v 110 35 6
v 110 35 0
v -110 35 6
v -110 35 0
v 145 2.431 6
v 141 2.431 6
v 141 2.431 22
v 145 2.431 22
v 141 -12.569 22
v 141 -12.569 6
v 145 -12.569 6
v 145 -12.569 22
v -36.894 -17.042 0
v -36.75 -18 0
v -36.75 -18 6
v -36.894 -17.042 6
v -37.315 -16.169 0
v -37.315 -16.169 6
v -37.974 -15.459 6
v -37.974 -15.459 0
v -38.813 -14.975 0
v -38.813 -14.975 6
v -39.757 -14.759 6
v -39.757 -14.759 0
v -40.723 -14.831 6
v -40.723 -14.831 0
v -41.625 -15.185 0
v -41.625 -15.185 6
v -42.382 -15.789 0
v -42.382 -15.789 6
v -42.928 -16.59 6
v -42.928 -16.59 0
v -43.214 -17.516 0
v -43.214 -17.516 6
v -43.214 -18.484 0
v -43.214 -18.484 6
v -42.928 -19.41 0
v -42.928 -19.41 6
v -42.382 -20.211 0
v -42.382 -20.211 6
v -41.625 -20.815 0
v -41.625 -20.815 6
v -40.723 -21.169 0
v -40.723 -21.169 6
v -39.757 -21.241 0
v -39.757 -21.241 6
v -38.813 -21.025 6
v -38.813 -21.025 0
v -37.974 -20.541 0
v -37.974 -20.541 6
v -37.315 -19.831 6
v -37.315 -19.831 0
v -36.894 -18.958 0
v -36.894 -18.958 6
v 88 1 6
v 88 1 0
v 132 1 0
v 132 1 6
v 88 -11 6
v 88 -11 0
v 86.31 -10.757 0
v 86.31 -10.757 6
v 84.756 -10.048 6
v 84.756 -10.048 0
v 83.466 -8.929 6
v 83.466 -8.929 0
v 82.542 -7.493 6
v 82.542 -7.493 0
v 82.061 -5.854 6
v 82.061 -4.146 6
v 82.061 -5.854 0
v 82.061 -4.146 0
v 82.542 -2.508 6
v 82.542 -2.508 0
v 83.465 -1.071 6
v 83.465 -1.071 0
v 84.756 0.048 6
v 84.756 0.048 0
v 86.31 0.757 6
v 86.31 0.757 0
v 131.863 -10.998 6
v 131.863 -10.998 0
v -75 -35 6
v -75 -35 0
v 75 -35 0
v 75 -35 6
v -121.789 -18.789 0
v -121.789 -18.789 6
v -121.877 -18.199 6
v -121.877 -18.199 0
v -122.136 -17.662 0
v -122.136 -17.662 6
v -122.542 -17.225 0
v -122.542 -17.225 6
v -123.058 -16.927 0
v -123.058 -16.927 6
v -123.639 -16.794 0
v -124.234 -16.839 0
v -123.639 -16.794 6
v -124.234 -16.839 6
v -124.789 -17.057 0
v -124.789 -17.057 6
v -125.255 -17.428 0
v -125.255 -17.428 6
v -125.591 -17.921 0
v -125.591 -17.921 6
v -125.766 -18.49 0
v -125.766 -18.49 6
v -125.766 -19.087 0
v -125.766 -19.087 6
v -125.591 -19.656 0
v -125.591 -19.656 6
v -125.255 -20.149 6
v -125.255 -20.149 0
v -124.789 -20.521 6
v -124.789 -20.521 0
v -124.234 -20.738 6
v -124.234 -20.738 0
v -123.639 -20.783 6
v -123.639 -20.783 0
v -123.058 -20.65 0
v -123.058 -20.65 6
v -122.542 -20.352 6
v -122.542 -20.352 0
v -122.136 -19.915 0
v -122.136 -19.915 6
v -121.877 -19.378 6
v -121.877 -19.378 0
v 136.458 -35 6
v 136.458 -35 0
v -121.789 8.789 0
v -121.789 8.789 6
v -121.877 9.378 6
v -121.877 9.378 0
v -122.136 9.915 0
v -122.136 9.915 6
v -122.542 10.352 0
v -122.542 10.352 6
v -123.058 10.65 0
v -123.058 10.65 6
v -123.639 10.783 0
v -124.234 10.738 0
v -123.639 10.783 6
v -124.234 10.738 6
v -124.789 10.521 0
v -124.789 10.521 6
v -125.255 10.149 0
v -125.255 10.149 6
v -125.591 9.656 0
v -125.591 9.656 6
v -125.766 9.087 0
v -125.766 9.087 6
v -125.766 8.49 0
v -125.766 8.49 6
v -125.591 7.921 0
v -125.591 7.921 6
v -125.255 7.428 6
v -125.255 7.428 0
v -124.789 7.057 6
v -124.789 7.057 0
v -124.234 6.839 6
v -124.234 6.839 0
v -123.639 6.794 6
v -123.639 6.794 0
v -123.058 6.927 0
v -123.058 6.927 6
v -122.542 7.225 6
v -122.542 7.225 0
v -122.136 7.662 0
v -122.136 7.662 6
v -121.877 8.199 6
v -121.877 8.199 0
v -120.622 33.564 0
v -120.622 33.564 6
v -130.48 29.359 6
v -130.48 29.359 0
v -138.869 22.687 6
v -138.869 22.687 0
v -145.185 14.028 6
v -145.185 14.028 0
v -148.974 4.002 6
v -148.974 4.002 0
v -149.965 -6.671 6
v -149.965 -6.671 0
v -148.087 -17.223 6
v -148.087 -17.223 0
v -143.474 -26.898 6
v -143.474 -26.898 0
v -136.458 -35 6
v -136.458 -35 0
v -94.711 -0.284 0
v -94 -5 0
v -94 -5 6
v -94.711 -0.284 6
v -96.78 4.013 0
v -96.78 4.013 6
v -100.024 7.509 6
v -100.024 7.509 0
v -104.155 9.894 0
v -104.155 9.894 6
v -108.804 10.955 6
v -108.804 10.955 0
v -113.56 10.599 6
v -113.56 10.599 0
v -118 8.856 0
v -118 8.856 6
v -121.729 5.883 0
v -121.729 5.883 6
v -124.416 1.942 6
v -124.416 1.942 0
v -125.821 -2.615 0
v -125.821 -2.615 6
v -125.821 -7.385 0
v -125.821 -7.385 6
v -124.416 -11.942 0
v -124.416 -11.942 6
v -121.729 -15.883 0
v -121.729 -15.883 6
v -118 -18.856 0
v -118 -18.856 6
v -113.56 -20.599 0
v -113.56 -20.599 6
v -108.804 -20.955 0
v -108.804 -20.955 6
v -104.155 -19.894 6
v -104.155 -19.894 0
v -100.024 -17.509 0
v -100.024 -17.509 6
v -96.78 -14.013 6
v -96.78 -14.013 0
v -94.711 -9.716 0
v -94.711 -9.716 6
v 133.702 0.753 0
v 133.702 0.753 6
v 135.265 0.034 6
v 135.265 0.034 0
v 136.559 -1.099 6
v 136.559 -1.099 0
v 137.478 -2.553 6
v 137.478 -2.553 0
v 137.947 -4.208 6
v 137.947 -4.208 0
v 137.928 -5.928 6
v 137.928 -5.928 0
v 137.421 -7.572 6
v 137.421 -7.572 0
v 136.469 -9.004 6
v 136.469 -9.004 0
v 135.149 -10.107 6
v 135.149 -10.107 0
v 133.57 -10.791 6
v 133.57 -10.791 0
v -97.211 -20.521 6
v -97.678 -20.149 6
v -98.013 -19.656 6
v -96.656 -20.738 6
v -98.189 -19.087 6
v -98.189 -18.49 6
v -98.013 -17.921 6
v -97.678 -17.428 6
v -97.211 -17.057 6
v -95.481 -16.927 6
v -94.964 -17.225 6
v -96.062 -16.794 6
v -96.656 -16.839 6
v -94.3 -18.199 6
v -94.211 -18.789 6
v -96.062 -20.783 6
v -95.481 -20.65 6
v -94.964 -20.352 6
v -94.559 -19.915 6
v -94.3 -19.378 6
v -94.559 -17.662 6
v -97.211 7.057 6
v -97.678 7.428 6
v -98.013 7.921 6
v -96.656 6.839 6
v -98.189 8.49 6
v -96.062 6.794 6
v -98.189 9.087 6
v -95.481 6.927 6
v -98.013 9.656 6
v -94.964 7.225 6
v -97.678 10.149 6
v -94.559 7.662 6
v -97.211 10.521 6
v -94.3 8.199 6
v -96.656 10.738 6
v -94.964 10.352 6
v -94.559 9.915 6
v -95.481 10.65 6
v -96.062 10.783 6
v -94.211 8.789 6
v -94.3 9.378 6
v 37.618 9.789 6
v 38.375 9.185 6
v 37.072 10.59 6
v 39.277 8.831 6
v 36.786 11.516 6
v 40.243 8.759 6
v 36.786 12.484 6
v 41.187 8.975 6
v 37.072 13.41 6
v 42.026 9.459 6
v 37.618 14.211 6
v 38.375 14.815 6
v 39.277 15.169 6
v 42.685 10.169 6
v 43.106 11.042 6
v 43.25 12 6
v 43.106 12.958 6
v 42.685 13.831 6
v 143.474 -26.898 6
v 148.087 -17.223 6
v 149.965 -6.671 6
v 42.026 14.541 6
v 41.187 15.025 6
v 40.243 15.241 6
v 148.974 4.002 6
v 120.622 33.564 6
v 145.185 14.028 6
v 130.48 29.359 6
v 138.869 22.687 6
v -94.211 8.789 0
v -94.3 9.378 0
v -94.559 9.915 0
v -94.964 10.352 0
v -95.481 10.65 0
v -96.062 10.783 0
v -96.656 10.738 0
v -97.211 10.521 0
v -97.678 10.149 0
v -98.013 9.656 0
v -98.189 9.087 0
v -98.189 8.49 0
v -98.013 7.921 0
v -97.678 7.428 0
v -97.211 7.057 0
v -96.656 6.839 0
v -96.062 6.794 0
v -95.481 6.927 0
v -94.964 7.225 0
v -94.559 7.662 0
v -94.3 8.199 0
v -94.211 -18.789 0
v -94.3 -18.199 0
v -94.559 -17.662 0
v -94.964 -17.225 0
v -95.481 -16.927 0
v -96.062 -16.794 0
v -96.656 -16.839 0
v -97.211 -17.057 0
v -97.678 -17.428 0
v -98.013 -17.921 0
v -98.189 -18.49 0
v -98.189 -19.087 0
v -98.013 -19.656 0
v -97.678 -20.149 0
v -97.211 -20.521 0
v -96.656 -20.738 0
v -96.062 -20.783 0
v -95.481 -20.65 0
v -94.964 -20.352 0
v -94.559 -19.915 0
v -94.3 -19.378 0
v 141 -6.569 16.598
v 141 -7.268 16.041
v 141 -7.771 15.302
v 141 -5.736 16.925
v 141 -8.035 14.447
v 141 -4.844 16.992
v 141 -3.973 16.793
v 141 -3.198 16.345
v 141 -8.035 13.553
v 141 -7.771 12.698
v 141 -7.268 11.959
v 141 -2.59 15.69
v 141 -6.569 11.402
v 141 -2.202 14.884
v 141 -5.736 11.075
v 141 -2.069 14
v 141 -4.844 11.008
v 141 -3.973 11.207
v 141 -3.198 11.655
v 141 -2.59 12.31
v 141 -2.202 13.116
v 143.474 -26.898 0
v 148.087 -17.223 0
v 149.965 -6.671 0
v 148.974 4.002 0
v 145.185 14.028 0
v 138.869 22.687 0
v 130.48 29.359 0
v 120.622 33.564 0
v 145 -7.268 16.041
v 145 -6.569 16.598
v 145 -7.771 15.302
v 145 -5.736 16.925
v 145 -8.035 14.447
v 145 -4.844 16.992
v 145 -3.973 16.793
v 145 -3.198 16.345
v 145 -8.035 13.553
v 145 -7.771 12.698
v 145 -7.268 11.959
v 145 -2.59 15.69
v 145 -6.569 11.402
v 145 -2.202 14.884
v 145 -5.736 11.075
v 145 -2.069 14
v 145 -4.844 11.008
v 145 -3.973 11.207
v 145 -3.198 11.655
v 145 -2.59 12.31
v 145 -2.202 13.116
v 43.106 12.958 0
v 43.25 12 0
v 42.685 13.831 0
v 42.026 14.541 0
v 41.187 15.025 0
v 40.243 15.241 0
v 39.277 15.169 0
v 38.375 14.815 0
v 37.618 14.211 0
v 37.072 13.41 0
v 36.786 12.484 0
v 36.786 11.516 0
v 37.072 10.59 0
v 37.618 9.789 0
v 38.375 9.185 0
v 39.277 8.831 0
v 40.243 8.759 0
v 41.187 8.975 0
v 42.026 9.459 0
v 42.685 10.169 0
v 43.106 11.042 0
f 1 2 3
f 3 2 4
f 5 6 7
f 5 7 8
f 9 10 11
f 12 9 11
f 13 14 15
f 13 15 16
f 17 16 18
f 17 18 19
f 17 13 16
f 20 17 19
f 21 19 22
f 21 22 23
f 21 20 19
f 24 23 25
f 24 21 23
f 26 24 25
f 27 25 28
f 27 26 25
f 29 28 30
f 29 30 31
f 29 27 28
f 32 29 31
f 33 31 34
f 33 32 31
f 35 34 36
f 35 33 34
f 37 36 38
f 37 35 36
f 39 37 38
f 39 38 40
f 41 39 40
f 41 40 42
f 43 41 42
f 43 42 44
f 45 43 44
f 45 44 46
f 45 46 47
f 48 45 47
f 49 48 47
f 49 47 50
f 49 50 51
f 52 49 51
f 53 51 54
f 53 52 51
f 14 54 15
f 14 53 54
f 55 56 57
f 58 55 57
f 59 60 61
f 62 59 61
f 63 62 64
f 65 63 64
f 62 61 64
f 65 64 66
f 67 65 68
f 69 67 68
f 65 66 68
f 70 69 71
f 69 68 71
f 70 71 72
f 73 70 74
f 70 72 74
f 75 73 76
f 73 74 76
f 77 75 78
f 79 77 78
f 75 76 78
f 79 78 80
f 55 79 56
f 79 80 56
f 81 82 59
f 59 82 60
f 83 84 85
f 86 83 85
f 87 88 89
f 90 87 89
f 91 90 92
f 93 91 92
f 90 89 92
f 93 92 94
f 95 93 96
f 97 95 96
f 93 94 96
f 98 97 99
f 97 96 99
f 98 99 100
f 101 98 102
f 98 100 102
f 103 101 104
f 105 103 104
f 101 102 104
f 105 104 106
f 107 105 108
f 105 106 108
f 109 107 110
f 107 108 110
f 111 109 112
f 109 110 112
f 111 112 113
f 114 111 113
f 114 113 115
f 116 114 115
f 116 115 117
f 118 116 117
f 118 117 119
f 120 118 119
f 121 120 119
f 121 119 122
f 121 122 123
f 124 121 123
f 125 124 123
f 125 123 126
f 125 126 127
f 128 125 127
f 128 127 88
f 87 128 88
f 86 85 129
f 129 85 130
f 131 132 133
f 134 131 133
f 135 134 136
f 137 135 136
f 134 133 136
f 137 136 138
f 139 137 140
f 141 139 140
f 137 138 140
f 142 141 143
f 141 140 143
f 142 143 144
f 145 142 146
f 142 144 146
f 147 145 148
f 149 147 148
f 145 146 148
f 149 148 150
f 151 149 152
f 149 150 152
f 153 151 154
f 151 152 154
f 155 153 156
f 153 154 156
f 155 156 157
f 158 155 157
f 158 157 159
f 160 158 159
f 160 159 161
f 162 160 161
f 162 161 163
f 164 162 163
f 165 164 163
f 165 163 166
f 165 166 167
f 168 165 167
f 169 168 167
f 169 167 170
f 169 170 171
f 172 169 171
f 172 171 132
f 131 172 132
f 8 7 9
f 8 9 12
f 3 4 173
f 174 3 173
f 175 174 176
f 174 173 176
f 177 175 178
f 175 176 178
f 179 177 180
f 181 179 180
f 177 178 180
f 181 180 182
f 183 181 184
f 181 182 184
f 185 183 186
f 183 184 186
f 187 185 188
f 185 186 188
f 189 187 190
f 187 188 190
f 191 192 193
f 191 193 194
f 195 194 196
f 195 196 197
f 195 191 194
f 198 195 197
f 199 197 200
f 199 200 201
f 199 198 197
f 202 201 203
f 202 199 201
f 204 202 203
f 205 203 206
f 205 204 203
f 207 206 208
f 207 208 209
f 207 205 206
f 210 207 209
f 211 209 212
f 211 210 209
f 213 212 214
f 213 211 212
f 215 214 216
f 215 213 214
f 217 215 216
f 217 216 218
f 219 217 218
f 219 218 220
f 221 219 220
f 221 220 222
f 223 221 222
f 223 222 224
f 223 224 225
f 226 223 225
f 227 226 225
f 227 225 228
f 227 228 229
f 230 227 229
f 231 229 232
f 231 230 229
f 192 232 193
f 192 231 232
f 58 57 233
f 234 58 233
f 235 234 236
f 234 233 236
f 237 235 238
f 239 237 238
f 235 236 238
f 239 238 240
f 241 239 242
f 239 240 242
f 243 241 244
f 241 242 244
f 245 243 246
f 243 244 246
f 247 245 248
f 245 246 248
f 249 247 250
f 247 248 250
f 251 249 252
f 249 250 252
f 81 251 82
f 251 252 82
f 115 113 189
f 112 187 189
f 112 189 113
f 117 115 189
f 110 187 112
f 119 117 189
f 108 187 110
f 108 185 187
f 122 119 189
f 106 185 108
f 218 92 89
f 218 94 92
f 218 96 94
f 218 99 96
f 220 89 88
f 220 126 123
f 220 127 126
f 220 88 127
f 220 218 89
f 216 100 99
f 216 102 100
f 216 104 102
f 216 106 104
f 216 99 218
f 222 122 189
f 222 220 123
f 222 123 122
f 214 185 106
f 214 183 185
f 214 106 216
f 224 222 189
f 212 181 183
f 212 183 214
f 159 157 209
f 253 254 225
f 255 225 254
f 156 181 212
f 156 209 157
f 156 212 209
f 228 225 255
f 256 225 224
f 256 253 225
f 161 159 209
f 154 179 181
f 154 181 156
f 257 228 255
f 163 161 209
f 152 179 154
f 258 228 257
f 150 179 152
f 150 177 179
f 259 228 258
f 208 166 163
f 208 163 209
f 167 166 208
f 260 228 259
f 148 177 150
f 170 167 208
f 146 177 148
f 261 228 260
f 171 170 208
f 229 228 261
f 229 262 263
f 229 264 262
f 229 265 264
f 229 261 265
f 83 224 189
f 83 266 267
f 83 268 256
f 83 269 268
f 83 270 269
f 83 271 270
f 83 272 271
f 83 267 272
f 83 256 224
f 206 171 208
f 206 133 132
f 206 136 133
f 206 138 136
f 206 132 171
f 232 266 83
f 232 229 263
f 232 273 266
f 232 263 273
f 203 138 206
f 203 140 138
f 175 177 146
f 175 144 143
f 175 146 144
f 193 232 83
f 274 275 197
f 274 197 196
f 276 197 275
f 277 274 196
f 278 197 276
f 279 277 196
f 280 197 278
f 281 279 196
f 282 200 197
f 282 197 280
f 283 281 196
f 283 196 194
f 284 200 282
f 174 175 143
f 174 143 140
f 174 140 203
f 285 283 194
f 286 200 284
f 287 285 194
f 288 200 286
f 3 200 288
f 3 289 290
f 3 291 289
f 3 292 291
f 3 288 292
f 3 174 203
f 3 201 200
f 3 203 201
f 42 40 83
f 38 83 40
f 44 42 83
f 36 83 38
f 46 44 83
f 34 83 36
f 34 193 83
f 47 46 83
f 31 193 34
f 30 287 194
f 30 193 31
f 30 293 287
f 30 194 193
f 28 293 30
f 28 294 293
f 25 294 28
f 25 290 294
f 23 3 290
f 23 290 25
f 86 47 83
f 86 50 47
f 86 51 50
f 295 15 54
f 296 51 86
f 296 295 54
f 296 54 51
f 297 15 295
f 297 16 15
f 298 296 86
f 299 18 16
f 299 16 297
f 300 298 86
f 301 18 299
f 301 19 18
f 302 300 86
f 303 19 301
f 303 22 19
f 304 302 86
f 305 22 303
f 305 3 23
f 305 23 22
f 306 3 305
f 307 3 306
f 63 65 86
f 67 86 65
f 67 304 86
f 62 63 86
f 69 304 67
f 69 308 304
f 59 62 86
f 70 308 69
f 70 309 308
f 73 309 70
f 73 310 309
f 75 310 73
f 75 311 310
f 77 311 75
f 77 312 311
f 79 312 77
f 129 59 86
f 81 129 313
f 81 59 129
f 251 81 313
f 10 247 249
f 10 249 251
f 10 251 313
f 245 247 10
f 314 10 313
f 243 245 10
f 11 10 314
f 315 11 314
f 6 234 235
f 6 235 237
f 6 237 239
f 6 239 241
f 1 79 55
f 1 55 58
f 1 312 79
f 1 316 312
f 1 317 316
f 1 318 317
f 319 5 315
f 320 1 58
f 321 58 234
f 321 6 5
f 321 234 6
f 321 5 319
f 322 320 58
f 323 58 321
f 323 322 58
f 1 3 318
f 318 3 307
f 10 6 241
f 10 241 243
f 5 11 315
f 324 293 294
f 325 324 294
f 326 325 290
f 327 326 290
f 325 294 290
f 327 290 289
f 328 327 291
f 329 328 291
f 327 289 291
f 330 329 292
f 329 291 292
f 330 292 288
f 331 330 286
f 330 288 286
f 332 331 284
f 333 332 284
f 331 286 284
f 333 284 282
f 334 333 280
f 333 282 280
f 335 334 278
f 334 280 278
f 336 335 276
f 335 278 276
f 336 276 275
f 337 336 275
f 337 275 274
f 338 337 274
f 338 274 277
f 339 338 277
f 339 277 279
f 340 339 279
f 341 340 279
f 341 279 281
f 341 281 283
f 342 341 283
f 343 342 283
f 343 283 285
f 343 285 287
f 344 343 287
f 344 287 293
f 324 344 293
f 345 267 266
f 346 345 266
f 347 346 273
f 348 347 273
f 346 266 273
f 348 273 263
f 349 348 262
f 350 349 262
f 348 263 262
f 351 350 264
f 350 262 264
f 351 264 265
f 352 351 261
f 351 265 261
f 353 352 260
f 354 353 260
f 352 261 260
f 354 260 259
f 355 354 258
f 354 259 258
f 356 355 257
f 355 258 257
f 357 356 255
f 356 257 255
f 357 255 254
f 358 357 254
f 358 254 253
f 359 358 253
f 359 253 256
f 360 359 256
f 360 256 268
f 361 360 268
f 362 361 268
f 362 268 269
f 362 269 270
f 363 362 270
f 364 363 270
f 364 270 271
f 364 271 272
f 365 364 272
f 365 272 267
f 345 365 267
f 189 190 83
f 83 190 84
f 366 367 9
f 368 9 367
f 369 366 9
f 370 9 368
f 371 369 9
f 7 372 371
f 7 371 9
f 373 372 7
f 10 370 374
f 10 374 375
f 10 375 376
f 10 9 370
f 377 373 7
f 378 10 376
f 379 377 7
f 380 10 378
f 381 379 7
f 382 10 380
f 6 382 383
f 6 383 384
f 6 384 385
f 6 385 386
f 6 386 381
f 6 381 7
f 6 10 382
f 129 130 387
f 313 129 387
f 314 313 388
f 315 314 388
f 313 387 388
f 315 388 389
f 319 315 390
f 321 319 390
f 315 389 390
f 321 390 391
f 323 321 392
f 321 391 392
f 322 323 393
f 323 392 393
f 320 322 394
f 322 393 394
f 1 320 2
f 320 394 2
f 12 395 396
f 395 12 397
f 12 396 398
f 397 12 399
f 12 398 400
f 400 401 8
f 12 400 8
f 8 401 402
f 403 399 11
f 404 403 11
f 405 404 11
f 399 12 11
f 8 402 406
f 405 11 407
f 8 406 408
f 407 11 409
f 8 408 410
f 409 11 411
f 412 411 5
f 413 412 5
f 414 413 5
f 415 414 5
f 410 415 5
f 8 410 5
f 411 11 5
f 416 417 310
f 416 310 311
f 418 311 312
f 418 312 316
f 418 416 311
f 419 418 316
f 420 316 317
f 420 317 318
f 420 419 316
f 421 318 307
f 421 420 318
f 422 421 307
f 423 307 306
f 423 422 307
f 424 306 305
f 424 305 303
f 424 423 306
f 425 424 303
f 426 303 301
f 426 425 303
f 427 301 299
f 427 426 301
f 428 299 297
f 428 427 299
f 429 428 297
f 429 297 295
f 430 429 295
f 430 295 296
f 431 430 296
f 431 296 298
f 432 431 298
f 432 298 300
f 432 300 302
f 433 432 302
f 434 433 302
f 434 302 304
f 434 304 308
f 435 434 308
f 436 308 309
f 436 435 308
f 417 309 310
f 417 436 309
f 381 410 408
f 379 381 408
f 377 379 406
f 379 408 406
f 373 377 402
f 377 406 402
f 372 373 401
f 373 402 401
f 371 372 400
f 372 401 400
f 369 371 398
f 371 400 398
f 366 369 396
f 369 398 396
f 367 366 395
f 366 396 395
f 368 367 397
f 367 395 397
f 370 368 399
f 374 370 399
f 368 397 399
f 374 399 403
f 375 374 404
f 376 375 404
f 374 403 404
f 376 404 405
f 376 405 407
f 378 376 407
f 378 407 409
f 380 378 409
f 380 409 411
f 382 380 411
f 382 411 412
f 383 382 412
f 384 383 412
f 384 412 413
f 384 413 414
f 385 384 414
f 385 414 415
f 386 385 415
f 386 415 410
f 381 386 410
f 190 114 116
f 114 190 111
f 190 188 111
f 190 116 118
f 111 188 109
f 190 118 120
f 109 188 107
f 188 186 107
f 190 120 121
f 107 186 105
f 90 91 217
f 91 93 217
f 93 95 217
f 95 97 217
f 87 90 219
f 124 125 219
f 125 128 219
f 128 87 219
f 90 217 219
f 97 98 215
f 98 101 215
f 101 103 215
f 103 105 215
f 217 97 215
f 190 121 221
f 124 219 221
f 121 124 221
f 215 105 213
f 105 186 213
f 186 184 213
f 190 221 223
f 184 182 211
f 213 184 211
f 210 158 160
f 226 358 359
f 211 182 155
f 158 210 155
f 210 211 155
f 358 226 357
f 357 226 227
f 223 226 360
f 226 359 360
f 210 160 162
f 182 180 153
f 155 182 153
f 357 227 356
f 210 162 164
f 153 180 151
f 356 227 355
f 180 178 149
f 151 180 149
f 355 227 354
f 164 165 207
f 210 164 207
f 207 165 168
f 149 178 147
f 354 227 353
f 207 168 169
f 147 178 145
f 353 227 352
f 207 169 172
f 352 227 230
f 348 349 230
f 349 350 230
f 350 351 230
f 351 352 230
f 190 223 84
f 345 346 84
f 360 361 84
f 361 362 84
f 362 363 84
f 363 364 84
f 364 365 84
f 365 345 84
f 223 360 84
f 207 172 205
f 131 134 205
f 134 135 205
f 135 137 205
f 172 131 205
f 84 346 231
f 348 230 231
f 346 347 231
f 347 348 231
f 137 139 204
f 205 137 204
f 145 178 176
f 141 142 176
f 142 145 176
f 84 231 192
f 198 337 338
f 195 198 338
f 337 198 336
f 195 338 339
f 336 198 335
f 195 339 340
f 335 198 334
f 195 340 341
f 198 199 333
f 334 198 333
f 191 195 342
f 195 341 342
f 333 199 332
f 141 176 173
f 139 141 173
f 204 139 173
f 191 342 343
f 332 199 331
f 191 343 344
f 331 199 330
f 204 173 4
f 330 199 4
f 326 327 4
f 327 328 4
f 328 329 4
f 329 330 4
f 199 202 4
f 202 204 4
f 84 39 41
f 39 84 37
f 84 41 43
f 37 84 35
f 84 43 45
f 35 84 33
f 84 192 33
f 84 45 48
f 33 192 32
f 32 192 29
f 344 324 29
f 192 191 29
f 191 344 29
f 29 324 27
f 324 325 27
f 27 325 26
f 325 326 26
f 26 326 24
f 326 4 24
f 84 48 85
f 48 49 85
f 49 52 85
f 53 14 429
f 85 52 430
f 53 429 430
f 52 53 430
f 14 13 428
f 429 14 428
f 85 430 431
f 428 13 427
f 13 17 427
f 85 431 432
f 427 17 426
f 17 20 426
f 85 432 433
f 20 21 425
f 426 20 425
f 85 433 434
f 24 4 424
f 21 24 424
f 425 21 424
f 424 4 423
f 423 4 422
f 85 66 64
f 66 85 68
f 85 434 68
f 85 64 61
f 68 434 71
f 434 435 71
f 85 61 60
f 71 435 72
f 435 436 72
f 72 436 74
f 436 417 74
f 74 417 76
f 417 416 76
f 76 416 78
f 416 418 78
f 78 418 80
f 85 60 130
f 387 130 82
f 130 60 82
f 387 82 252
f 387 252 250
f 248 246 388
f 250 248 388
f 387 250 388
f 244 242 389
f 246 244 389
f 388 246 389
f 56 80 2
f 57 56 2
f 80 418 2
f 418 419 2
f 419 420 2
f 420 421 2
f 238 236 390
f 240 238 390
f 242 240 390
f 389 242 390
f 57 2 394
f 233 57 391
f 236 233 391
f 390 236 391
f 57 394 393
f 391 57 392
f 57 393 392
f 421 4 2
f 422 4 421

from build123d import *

# Parameters (mm, degrees)
F0_R     = 3.25
F0_R_2   = 16
F1_DEPTH = 6
F2_W     = 4
F2_H     = 15
F3_DEPTH = 16
F4_R     = 3
F5_DEPTH = 25
F6_R     = 2
F6_R_2   = 16
F7_DEPTH = 25


# Not quite as in the source:
# - ends of sketch curves that miss each other by under 0.0002 mm in the source are joined


with BuildPart() as f1:
    # F0 (on Top) → F1 (new body)
    with BuildSketch(Plane.XY):
        with BuildLine():
            ThreePointArc((136.4575130484, -35.0000000549), (147.4165738824, 9.1421355849), (110, 35))
            Line((110, 35), (75, 35))
            Line((75, 35), (-75, 35))
            Line((-75, 35), (-110, 35))
            ThreePointArc((-110, 35), (-147.4165737498, 9.1421359357), (-136.4575136109, -34.9999995588))
            Line((-136.4575136109, -34.9999995588), (-75, -35))
            Line((-75, -35), (75, -35))
            Line((75, -35), (136.4575130484, -35.0000000549))
        make_face()
        with Locations((-40, -18)):
            Circle(F0_R, mode=Mode.SUBTRACT)
        with Locations((-110, -5)):
            Circle(F0_R_2, mode=Mode.SUBTRACT)
        with BuildLine():
            Line((88, 1), (132, 1))
            ThreePointArc((132, 1), (137.9996084013, -5.0685494815), (131.862909985, -10.9984336562))
            Line((131.862909985, -10.9984336562), (88.000112, -11))
            ThreePointArc((88.000112, -11), (82.0000000003, -5.000056), (88, 1))
        make_face(mode=Mode.SUBTRACT)
        with Locations((40, 12)):
            Circle(F0_R, mode=Mode.SUBTRACT)
    extrude(amount=F1_DEPTH)

    # F2 (on face) → F3 (join)
    with BuildSketch(Plane.XY.offset(6)):
        with Locations((143, -5.0685494815)):
            Rectangle(F2_W, F2_H)
    extrude(amount=F3_DEPTH)

    # F4 (on face) → F5 (cut)
    with BuildSketch(Plane.YZ.offset(145)):
        with Locations((-5.0685494815, 14)):
            Circle(F4_R)
    extrude(amount=-F5_DEPTH, mode=Mode.SUBTRACT)

    # F6 (on face) → F7 (cut)
    with BuildSketch(Plane.XY.offset(6)):
        with Locations((-123.7885822331, 8.7885822331)):
            Circle(F6_R)
        with Locations((-96.2114177669, 8.7885822331)):
            Circle(F6_R)
        with Locations((-96.2114177669, -18.7885822331)):
            Circle(F6_R)
        with Locations((-123.7885822331, -18.7885822331)):
            Circle(F6_R)
        with Locations((-110, -5)):
            Circle(F6_R_2)
    extrude(amount=-F7_DEPTH, mode=Mode.SUBTRACT)


solid = f1.part
